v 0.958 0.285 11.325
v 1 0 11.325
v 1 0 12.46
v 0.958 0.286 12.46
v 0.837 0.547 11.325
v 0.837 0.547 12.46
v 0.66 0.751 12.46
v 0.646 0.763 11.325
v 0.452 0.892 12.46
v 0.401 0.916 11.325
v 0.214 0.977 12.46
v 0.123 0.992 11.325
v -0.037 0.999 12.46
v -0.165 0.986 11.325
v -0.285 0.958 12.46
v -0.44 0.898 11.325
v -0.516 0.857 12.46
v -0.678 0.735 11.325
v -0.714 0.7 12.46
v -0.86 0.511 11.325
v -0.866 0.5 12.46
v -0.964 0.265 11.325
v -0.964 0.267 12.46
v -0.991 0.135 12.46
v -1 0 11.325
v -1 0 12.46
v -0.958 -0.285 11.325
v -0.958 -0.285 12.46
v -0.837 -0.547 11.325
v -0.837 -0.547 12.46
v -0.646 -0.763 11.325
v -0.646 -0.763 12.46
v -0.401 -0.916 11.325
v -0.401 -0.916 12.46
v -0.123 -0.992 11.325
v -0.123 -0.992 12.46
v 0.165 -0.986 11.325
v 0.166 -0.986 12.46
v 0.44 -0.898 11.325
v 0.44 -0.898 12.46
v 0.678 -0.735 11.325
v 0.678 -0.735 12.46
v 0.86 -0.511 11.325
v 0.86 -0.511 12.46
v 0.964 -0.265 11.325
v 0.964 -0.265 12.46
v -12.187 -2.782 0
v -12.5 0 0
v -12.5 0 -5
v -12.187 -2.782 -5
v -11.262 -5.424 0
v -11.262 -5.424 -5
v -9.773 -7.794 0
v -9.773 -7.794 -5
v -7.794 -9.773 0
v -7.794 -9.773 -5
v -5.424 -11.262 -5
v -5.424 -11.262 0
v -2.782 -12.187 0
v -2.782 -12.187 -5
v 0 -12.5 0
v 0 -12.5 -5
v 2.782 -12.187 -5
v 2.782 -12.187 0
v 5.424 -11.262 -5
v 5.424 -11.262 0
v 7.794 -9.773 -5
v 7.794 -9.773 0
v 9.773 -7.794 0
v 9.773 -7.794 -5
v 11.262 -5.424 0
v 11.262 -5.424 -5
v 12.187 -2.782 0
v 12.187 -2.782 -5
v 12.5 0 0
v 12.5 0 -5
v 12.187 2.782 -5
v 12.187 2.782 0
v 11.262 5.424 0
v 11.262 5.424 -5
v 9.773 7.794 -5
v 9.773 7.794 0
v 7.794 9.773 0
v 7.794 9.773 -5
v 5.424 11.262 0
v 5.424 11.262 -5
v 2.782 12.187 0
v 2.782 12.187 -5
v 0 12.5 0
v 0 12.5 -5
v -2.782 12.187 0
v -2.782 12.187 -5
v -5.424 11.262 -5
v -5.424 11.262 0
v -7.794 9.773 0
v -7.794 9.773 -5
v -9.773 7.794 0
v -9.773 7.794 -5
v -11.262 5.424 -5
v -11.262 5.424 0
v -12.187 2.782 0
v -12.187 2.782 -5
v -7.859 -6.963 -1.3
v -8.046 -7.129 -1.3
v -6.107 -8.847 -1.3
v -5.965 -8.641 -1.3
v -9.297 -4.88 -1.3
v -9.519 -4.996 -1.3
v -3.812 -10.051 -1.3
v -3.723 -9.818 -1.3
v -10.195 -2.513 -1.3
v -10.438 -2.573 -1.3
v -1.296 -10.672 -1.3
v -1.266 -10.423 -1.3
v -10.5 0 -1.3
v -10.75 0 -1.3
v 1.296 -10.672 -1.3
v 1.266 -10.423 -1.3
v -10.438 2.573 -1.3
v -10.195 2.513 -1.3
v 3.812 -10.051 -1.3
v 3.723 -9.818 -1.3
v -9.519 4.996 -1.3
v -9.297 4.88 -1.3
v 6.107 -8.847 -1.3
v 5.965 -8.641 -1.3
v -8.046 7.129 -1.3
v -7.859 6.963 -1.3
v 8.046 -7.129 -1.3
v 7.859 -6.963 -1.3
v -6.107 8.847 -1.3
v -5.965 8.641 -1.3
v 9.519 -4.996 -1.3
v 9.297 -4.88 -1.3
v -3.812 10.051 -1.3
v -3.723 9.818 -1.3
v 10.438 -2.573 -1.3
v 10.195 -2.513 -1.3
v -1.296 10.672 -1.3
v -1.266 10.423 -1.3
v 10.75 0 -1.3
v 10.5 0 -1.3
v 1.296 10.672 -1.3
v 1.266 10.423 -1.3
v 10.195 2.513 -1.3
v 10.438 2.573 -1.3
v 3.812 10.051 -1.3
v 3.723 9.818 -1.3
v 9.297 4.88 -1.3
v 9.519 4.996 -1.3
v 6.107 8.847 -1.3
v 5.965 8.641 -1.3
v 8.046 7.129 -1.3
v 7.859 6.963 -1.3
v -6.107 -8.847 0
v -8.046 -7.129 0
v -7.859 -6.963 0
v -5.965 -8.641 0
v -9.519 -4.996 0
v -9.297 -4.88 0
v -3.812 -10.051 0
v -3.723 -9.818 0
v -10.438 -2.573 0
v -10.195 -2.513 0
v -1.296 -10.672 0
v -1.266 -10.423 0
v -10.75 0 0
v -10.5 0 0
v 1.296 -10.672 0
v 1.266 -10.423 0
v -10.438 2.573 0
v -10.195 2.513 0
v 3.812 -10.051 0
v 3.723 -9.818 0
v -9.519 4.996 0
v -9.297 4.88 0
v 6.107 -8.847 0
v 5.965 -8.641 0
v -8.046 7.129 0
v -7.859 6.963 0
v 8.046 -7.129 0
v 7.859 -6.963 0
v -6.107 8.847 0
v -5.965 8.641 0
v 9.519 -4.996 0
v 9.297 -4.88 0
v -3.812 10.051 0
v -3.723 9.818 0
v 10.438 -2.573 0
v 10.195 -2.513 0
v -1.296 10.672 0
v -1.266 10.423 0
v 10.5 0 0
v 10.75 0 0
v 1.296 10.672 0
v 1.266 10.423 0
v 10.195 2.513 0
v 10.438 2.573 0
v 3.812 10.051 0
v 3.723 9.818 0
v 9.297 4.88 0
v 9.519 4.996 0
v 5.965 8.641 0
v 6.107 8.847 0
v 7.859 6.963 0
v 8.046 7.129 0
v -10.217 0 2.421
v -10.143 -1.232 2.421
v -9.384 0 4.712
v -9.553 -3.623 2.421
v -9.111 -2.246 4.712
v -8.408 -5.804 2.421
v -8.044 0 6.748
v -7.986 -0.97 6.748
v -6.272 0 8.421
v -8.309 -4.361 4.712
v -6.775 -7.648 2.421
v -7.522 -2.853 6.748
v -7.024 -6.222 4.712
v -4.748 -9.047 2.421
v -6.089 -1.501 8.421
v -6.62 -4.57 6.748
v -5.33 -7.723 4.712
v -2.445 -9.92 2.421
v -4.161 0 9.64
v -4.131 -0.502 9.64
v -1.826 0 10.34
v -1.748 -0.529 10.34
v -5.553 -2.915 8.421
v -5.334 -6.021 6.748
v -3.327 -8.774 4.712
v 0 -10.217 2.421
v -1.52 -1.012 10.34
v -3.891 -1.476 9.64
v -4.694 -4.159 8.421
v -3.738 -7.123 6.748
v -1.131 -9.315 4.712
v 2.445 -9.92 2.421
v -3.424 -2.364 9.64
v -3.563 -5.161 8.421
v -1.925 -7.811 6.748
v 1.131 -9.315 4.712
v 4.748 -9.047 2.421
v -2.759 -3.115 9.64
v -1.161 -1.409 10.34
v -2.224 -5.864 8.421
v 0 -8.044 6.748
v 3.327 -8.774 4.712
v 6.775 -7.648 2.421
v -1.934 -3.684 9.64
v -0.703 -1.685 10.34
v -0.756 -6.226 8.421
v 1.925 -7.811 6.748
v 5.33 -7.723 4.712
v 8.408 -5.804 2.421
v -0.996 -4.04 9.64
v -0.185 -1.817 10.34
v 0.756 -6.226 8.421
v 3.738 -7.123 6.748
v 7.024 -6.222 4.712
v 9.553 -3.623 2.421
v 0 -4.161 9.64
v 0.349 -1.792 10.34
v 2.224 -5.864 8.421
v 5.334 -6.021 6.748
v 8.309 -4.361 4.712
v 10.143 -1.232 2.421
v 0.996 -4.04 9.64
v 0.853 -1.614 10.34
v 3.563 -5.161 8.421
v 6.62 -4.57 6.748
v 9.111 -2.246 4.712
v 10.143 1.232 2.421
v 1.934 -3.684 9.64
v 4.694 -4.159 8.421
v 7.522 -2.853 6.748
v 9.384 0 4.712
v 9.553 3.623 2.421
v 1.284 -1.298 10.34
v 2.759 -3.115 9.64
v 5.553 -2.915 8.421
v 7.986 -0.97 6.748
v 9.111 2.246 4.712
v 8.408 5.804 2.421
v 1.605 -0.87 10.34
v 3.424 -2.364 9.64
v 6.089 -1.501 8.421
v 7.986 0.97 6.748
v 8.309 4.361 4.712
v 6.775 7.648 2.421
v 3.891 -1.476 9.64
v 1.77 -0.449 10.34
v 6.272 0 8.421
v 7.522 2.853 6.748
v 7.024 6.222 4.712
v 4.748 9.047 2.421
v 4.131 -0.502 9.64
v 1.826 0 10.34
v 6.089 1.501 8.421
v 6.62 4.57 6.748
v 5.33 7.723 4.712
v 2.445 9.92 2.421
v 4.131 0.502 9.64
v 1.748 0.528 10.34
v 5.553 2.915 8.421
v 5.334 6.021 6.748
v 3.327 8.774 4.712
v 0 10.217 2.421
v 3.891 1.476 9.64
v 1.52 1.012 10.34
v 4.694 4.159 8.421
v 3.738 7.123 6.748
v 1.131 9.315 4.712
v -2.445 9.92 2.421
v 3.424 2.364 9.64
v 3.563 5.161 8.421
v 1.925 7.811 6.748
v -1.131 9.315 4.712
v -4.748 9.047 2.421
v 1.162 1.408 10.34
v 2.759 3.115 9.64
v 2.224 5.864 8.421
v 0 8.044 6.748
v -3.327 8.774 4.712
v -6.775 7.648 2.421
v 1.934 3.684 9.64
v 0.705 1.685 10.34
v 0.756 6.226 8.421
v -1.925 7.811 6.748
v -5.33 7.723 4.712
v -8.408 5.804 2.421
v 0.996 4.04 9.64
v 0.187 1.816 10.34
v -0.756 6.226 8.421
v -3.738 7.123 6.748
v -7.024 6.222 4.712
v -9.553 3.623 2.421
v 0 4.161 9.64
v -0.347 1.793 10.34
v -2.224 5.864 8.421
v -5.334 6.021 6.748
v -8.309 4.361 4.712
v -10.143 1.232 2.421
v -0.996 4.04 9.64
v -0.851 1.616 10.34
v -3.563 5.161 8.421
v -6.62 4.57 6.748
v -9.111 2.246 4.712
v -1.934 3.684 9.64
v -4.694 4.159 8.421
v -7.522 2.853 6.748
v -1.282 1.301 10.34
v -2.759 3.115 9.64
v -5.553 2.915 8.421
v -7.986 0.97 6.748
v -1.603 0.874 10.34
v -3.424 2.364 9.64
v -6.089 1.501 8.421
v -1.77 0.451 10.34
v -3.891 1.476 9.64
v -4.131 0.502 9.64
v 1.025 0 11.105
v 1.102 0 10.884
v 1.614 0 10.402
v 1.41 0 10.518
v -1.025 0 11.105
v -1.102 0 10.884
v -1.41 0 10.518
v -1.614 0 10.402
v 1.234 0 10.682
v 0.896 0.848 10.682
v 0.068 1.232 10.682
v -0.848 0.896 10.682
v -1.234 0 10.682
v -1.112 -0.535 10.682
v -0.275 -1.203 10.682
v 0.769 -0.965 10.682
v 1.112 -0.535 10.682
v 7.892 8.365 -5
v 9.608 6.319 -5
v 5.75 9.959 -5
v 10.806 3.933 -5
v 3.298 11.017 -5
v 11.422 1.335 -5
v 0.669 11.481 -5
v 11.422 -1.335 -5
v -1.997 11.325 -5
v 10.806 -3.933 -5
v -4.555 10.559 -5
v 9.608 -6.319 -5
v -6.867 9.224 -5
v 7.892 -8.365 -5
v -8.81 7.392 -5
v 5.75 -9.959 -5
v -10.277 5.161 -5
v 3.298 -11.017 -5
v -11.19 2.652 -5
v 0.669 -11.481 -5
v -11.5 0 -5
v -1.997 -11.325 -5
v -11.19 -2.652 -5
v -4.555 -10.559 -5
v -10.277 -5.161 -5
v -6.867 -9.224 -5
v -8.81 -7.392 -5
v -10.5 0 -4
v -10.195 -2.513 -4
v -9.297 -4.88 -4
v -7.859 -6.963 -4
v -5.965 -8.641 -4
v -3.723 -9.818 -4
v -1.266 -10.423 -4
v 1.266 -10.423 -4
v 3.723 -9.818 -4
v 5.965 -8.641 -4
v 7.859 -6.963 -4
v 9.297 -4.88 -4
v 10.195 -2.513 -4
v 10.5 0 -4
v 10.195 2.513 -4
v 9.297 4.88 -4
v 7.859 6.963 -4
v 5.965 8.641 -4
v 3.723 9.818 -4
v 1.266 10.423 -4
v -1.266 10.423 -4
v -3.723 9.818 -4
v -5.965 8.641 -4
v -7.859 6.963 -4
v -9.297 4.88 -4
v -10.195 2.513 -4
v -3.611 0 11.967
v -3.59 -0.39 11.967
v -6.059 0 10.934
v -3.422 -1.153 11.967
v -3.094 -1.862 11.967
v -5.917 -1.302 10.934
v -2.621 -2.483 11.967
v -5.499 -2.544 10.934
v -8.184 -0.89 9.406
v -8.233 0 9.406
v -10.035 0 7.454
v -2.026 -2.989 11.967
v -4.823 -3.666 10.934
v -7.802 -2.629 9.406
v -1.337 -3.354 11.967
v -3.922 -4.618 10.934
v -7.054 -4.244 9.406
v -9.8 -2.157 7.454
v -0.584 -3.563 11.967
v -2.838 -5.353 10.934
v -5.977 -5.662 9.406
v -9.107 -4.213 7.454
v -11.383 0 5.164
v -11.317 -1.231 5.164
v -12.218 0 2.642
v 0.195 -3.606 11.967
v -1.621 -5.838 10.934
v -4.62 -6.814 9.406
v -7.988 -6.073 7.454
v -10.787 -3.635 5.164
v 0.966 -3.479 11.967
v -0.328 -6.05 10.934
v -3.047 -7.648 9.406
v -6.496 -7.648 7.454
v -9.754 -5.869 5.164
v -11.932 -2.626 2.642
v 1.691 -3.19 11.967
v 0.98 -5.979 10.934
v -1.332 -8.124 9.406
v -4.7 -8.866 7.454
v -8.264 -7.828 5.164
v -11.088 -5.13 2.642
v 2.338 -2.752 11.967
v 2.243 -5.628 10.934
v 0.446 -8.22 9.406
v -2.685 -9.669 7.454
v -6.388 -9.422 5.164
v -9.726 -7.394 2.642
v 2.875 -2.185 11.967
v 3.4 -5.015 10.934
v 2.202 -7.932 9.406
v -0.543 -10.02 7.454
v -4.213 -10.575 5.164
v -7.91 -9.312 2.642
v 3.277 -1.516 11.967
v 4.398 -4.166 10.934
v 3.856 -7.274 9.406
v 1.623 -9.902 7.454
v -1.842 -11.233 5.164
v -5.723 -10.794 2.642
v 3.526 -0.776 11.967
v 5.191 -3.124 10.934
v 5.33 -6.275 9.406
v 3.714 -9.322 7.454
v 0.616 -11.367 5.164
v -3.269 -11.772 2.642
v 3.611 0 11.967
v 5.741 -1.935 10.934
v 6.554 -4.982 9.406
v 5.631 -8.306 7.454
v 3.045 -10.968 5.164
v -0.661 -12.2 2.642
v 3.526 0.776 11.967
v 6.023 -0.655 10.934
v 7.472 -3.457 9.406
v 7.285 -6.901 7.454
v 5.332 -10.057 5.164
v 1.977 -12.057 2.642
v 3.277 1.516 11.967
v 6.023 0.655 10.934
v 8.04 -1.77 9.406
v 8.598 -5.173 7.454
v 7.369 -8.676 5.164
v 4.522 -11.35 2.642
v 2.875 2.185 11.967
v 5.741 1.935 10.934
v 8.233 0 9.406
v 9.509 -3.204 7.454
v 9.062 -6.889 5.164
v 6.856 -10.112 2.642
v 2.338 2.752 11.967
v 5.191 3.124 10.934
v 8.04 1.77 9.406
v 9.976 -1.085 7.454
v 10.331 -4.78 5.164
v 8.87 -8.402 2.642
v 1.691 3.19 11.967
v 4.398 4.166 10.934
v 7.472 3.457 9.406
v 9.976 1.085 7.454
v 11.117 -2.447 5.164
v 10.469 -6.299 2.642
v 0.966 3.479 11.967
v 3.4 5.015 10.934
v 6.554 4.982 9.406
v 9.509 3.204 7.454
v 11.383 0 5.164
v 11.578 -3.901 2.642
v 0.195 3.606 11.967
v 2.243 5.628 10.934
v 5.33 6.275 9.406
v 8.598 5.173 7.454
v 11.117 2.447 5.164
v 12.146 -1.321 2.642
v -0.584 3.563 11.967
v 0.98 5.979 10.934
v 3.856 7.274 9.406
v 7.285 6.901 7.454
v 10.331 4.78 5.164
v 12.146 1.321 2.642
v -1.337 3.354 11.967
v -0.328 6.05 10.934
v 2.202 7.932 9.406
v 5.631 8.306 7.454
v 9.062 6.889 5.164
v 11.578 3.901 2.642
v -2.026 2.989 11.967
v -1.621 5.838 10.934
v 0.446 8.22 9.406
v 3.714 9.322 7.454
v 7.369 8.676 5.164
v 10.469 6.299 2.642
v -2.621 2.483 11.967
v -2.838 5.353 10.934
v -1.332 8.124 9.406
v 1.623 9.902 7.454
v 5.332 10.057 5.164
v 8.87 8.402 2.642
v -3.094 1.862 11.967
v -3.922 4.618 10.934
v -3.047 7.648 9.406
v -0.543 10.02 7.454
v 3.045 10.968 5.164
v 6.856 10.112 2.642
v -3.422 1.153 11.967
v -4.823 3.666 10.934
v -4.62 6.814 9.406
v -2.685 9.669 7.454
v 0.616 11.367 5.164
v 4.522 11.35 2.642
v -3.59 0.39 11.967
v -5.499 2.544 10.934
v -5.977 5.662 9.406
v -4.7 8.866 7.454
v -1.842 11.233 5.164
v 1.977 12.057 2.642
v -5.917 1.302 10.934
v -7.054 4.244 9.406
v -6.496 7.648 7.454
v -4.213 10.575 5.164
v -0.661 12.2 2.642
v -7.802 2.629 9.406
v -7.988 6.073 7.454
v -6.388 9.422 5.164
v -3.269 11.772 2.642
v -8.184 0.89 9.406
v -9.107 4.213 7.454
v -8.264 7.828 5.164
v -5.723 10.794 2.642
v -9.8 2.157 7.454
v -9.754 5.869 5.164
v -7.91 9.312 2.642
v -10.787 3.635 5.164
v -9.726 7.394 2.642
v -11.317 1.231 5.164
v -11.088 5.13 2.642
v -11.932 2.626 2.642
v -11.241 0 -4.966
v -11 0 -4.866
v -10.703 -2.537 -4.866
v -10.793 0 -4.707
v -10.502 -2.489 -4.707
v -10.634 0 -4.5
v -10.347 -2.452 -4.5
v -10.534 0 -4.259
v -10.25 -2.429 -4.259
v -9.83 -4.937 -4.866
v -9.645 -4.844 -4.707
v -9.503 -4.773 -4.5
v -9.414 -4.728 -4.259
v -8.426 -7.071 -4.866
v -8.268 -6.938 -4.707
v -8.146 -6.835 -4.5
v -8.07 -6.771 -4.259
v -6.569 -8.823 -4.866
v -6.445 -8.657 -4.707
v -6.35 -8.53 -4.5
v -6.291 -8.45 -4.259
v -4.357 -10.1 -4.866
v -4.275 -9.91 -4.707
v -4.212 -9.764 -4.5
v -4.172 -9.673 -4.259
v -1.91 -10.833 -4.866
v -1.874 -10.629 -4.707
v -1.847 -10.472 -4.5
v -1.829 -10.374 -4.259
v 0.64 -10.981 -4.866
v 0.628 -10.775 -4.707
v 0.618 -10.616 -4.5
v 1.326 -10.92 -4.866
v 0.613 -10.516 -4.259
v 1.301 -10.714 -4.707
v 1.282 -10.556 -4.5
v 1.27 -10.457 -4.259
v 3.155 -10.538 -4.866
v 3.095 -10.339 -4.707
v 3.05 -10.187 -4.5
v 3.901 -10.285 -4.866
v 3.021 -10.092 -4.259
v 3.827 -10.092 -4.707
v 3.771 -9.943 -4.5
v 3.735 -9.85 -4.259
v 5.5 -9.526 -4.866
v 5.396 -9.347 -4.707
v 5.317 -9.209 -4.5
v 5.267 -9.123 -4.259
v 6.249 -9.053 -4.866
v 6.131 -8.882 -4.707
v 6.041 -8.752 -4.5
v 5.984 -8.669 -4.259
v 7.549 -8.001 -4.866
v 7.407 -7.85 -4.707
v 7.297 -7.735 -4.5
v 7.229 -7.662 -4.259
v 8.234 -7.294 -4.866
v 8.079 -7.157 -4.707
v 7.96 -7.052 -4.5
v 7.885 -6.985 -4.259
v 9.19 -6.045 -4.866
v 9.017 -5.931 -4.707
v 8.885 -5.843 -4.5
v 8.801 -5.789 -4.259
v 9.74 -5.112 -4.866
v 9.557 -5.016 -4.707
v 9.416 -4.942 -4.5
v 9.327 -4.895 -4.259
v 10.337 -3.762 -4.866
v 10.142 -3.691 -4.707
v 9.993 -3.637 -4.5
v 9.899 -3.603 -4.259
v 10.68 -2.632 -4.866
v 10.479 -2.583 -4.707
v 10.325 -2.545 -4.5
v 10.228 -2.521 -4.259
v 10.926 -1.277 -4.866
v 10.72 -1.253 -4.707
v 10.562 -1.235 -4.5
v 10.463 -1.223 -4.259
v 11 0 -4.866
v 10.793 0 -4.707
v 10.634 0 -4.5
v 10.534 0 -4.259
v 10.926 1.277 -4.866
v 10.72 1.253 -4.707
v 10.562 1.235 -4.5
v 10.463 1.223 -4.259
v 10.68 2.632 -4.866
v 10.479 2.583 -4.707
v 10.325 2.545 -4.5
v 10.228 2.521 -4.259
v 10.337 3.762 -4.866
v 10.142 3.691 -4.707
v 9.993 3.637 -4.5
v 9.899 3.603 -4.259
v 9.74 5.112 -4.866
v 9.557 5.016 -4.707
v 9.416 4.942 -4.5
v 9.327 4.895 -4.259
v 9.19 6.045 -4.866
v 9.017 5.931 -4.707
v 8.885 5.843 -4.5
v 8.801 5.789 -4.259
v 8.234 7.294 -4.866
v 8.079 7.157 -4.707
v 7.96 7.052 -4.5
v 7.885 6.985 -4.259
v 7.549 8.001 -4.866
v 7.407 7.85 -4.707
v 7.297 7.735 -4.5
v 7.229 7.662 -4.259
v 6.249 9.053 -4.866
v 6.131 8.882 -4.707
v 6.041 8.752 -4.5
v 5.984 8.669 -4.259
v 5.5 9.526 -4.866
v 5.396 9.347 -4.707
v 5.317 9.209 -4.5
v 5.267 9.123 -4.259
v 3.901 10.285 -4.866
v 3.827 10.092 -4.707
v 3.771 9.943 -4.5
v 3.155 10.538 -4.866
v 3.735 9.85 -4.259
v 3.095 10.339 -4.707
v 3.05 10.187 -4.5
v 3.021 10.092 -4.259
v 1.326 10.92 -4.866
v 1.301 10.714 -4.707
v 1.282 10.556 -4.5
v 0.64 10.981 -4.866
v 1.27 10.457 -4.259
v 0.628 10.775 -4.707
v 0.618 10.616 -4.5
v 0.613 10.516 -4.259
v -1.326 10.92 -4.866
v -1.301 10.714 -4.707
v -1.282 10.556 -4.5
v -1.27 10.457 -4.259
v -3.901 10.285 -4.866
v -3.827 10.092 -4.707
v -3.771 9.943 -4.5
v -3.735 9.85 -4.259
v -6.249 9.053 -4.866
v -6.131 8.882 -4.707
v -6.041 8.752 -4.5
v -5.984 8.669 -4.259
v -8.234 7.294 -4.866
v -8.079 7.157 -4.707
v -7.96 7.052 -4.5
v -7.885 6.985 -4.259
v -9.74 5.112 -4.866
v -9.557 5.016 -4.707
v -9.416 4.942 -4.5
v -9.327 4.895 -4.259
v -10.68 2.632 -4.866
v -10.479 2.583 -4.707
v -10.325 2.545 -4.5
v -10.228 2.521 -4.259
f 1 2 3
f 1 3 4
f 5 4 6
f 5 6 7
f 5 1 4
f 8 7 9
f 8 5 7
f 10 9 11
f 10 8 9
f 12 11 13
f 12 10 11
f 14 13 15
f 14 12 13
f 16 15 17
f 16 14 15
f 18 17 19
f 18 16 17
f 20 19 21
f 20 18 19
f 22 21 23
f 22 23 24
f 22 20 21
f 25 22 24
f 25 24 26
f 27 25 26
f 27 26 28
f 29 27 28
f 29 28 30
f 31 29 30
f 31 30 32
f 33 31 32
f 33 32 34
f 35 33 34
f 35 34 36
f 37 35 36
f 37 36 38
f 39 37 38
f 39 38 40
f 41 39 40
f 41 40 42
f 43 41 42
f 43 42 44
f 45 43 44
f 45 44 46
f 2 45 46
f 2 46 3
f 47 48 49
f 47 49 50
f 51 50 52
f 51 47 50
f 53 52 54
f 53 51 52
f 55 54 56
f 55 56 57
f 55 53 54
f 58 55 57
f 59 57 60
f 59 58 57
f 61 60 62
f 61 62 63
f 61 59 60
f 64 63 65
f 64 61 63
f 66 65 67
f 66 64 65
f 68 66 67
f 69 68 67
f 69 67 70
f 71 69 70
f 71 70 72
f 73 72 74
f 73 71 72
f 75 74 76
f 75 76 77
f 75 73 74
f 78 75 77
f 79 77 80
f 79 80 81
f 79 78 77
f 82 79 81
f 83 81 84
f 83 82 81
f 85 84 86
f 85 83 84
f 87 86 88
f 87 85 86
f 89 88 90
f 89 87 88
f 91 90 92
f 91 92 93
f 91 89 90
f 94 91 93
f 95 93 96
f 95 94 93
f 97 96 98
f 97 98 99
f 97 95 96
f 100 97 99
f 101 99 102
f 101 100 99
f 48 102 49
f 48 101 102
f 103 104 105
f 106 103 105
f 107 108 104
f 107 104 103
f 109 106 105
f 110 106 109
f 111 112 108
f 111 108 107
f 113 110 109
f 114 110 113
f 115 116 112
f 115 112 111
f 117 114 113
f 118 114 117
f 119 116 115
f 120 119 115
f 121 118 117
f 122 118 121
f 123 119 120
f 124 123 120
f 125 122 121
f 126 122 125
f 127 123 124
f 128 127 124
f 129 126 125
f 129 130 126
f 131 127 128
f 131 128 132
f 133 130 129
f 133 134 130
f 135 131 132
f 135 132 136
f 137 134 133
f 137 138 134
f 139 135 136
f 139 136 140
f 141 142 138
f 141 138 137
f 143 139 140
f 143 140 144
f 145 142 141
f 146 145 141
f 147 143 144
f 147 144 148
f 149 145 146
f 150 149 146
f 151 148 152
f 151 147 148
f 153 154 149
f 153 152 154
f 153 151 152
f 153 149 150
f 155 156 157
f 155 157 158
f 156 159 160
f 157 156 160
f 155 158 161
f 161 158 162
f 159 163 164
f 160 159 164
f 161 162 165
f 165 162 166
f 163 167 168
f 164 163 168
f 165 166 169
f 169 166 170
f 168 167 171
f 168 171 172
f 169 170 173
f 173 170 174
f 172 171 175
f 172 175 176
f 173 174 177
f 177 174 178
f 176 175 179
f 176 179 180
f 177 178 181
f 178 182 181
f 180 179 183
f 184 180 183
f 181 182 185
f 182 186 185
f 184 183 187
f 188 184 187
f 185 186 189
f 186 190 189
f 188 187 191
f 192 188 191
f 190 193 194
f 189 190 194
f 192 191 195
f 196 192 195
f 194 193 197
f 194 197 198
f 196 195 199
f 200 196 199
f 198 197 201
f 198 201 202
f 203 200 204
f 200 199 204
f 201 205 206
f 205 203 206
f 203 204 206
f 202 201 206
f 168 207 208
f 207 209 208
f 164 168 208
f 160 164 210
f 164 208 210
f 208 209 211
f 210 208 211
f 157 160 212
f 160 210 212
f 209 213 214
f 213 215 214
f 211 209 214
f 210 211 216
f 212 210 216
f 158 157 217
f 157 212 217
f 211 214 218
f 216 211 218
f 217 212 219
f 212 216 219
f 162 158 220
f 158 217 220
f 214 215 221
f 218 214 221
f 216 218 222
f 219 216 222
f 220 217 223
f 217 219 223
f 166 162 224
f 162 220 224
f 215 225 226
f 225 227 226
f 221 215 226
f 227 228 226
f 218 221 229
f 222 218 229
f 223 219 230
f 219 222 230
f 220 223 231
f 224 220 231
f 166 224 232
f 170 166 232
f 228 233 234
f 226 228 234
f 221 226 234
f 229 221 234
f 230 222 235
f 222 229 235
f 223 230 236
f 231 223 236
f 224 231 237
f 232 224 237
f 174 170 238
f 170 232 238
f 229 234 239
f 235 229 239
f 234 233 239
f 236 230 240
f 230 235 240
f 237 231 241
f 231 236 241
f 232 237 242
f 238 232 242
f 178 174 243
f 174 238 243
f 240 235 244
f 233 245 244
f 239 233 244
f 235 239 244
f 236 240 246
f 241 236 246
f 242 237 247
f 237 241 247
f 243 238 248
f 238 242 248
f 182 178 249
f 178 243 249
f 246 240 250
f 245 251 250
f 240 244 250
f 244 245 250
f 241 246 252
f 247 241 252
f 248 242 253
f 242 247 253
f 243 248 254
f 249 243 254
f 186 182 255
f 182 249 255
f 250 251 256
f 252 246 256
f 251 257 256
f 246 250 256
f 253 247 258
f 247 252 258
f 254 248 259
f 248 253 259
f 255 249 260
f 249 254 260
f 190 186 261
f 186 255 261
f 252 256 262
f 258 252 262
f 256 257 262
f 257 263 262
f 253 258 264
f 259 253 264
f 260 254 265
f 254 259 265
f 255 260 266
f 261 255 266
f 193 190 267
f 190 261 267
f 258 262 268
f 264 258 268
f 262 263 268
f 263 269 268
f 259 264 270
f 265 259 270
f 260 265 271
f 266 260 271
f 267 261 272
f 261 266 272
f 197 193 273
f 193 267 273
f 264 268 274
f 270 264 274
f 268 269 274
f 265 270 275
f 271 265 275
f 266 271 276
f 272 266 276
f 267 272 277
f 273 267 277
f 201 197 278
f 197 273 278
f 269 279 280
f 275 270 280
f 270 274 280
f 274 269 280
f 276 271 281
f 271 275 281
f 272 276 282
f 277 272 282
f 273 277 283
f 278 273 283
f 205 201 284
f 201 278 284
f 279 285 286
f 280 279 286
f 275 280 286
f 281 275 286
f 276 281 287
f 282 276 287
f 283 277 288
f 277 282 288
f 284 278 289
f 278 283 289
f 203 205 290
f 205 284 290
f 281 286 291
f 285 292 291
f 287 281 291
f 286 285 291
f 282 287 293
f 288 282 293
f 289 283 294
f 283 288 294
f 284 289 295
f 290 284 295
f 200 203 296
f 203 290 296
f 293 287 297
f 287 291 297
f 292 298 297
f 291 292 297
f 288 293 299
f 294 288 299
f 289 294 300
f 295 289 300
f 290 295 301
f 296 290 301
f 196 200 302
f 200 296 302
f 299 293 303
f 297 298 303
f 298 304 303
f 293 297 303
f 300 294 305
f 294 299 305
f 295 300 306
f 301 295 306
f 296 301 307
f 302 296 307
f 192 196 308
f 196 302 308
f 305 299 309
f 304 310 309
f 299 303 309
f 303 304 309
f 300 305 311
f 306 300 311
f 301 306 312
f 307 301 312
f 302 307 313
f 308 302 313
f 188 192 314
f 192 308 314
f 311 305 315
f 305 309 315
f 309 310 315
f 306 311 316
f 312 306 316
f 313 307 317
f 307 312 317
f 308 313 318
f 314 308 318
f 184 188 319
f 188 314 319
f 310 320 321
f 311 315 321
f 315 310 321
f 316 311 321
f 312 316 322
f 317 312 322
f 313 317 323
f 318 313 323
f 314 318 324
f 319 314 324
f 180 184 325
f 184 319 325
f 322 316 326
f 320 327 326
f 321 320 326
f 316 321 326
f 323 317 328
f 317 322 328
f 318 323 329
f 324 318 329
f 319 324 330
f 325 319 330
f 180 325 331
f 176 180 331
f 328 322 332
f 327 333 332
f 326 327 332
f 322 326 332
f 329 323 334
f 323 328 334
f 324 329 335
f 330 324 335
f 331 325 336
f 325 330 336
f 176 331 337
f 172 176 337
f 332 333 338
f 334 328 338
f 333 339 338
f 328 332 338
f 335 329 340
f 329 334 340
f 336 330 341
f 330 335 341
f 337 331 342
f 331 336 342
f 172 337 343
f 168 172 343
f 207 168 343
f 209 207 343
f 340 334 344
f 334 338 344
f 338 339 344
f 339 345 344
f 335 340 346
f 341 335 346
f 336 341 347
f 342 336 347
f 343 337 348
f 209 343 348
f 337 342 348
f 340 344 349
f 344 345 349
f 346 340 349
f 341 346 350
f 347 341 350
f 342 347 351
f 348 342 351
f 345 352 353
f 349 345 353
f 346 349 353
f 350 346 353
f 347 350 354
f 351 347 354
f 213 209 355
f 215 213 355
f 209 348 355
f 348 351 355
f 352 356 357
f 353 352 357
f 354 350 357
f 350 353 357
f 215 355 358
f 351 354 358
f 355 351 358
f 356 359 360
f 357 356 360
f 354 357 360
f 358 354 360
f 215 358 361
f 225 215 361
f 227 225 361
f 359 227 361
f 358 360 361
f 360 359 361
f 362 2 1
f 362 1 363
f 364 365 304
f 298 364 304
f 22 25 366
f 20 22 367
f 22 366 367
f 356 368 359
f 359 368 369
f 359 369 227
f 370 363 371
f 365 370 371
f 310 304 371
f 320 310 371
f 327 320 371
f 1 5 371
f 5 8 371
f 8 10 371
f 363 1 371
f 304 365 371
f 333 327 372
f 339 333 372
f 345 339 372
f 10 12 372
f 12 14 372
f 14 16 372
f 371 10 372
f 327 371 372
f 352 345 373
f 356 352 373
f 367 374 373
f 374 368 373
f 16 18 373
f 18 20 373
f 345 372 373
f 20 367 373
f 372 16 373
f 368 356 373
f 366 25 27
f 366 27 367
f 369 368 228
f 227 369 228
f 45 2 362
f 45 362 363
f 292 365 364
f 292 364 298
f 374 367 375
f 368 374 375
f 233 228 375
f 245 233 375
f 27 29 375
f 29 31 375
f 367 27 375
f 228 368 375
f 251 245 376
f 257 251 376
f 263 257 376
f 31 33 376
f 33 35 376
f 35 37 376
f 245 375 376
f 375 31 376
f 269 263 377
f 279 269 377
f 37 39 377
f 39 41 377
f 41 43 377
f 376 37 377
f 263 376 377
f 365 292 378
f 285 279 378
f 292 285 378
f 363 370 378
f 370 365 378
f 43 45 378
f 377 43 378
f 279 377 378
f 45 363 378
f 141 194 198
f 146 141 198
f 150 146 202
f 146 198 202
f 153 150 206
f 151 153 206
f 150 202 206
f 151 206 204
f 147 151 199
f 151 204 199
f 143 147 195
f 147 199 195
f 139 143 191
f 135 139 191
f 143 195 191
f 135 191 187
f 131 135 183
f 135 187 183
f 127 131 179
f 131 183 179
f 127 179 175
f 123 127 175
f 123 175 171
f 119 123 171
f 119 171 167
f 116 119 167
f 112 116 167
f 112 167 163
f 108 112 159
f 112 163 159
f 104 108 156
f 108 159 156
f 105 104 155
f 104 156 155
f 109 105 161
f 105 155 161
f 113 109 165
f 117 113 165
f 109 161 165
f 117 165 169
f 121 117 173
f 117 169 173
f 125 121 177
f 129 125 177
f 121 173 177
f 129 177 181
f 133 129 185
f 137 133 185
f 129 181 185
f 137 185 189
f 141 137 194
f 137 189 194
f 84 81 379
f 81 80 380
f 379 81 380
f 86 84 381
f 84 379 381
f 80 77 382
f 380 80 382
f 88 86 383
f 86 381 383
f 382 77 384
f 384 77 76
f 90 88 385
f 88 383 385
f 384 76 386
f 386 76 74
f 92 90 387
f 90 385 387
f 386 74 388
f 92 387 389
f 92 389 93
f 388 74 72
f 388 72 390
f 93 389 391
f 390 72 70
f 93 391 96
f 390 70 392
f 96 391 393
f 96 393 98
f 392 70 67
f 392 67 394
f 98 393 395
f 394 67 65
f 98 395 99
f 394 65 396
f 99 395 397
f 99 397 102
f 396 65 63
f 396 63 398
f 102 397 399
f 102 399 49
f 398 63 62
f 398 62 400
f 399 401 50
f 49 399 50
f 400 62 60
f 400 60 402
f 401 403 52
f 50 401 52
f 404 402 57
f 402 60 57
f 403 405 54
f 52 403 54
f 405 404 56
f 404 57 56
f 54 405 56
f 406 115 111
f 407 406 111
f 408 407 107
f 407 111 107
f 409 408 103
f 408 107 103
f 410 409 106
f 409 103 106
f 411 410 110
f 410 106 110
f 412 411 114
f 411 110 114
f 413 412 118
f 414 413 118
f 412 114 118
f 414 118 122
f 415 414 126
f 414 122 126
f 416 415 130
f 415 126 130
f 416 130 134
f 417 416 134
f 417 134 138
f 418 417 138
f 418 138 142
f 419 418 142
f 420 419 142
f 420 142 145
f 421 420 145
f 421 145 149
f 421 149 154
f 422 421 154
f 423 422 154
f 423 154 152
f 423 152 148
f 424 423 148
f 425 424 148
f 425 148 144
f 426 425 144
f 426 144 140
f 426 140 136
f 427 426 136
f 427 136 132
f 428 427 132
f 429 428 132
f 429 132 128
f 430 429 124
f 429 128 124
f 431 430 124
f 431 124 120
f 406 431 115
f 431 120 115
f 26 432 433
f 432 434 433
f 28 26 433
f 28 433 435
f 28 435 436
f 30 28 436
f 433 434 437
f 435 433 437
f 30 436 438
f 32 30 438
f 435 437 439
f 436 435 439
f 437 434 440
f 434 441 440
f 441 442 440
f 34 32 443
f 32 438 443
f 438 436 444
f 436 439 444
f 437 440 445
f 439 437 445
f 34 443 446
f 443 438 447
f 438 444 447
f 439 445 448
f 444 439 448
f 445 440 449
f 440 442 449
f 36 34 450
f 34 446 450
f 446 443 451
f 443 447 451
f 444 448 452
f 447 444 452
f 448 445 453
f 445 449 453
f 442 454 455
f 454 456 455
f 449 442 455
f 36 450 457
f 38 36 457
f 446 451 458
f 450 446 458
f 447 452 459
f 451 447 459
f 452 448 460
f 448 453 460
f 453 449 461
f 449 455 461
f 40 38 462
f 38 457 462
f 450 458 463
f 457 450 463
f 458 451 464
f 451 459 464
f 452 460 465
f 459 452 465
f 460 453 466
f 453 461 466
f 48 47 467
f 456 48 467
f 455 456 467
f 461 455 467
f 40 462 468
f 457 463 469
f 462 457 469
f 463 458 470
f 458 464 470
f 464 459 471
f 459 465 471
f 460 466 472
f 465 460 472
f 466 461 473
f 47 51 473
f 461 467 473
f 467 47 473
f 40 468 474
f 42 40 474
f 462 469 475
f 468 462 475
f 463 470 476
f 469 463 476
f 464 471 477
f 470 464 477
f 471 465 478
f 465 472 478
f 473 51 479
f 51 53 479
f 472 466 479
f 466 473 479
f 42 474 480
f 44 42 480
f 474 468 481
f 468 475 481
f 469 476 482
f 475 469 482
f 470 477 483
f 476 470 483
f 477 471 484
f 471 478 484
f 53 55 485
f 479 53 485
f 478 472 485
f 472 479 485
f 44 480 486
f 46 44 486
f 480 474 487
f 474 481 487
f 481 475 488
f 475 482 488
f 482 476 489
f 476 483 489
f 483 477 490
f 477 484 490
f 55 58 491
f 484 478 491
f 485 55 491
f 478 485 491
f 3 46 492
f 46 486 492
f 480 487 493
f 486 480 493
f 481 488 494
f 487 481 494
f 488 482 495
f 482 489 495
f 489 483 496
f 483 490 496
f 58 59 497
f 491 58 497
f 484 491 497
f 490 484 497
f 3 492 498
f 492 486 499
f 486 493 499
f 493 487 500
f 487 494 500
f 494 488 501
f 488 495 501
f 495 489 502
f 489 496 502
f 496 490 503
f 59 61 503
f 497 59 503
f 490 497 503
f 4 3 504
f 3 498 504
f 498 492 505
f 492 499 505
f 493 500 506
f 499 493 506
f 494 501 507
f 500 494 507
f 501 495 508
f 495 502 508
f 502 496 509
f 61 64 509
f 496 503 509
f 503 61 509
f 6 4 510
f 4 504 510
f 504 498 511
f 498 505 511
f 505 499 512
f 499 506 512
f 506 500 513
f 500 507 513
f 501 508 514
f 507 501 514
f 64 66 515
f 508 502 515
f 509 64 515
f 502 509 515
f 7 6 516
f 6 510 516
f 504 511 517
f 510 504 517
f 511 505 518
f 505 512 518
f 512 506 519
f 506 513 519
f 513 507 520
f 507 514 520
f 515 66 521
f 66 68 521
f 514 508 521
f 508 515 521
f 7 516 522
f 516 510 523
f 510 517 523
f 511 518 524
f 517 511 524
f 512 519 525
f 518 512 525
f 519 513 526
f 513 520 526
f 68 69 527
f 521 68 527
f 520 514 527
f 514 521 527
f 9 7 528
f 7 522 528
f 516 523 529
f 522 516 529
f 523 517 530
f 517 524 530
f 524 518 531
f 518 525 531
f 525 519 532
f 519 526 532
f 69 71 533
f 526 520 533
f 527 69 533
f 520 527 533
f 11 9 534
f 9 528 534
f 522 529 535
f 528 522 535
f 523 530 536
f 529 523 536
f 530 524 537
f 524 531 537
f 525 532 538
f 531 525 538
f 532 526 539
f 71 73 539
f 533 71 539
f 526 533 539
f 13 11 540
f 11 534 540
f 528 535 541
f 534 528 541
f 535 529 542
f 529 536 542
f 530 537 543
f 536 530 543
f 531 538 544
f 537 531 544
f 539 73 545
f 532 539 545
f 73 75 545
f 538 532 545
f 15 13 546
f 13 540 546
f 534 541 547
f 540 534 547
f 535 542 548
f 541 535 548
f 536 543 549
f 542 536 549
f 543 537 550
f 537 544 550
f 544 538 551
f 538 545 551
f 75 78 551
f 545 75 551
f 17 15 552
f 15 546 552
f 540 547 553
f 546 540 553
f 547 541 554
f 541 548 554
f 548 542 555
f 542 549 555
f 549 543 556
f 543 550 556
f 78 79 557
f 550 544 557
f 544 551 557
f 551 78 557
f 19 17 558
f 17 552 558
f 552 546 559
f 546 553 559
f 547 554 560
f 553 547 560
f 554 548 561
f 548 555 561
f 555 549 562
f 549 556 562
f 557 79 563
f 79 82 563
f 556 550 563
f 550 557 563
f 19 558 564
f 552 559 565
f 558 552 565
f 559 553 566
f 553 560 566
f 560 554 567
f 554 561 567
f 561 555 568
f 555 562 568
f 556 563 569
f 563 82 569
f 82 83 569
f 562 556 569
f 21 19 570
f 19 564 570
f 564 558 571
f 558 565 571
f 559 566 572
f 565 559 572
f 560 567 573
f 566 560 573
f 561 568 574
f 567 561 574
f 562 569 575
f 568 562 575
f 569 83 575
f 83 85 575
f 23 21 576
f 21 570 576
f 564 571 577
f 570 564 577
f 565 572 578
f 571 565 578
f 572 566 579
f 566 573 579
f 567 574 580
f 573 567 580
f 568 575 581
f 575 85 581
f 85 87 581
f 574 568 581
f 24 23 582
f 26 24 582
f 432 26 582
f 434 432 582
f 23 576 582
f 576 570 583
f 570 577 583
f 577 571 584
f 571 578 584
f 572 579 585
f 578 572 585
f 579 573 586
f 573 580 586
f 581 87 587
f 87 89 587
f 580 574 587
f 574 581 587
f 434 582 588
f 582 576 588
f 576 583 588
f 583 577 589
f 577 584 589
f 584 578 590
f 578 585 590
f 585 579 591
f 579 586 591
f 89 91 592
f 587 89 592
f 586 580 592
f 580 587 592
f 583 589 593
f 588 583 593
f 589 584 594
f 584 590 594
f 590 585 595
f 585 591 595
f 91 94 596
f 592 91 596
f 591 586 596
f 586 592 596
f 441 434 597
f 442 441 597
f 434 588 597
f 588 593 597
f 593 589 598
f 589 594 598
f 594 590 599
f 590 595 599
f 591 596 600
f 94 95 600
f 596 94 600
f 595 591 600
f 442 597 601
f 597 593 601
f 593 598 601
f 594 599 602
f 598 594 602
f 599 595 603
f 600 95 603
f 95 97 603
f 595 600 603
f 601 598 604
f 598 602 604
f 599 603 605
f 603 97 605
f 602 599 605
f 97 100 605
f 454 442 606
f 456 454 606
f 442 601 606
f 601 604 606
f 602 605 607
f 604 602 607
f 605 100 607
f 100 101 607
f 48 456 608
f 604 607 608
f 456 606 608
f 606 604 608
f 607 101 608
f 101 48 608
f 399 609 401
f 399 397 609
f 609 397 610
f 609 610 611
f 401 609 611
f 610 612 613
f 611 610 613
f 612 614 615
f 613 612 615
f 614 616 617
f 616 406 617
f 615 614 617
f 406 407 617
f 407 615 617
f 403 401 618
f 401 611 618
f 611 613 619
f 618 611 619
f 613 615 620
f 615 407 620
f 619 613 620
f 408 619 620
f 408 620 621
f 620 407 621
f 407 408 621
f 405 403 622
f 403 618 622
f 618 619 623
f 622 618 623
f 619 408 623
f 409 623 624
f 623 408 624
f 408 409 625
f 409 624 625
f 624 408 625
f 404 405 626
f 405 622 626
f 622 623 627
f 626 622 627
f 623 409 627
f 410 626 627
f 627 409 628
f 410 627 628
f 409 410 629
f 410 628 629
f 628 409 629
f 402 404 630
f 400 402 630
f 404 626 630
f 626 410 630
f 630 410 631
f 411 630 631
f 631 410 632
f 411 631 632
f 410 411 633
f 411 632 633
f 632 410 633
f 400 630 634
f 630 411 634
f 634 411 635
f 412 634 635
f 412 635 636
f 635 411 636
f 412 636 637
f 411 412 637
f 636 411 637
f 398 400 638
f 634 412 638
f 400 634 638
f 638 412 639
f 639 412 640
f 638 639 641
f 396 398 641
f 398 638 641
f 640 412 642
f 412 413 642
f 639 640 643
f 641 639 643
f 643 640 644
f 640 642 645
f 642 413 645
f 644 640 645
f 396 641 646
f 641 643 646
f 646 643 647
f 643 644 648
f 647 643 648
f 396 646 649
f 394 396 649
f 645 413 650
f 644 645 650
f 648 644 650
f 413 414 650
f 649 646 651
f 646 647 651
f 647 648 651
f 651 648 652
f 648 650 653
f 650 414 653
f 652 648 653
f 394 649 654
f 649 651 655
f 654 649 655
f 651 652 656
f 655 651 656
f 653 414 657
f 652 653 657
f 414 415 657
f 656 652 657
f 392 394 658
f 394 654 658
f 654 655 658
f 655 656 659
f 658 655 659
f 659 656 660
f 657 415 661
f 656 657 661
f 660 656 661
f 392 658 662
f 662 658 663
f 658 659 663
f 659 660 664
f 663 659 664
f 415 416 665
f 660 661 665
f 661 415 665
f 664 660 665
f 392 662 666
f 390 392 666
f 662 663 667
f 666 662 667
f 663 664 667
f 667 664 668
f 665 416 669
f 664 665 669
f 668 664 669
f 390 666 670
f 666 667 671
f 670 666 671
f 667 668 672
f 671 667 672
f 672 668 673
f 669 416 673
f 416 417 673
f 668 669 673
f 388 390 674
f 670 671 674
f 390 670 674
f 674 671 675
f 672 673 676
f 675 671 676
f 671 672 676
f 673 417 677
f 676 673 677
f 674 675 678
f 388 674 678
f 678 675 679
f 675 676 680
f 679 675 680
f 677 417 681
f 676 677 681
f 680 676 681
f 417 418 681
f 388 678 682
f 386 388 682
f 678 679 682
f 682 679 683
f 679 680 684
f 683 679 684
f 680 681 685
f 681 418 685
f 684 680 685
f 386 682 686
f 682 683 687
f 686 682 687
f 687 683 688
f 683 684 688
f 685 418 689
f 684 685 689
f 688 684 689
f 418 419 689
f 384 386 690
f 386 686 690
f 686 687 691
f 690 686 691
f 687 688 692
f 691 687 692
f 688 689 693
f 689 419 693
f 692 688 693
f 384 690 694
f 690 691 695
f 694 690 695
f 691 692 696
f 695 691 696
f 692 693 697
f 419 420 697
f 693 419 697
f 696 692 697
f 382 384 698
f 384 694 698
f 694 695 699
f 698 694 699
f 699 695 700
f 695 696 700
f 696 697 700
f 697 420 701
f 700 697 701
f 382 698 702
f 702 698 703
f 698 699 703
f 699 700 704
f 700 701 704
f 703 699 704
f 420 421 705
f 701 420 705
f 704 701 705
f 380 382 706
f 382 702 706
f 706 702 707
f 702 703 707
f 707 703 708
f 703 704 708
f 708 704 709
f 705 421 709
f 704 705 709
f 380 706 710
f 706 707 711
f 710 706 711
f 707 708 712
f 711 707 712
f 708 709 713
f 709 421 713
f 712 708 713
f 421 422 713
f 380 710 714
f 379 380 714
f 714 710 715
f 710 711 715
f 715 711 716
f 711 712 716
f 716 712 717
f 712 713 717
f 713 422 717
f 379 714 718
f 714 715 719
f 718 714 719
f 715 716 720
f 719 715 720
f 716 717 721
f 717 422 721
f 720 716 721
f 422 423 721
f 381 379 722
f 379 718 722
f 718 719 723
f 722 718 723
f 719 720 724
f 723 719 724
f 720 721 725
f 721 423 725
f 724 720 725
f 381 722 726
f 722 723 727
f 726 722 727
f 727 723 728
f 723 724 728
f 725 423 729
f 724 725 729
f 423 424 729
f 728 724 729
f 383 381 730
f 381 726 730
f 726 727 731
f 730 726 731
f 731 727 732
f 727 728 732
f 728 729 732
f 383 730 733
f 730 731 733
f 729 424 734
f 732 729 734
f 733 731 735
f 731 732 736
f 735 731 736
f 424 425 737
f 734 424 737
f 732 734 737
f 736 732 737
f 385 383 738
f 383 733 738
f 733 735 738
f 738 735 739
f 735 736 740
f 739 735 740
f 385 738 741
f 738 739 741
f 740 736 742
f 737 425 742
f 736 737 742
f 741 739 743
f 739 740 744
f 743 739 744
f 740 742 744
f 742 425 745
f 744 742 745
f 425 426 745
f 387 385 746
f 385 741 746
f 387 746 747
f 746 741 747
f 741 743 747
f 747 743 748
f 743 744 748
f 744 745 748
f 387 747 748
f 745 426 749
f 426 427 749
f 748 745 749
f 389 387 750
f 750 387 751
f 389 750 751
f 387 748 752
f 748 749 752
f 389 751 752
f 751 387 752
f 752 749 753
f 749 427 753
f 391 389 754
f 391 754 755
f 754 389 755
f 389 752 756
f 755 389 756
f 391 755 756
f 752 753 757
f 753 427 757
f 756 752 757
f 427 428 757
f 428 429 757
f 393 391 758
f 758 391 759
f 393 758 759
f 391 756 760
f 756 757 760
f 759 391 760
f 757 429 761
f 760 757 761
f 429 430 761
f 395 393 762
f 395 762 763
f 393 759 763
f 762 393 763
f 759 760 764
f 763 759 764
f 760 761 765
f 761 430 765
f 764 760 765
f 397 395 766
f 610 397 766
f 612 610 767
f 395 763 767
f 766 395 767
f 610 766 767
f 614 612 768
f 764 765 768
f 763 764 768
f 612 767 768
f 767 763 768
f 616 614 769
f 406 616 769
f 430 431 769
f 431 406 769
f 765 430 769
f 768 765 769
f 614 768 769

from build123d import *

# Parameters (mm, degrees)
F4_DEPTH = 5
F3_R     = 10.75
F5_DEPTH = 1.3
F6_R     = 1
F7_DEPTH = 22.1
F8_R     = 1


with BuildPart() as f2:
    # F0 (on Front) → F2 (revolve)
    with BuildSketch(Plane.XZ):
        with BuildLine():
            ThreePointArc((-10.5, 0), (-7.4246212025, 7.4246212025), (0, 10.5))
            Line((0, 10.5), (0, 12.5))
            ThreePointArc((0, 12.5), (-8.8388347648, 8.8388347648), (-12.5, 0))
            Line((-12.5, 0), (-10.5, 0))
        make_face()
    revolve(axis=Axis((0, 0, 21.9115), (0, 0, 1)))

    # F4 (add): a face of the model
    f4_faces = [f2.faces().sort_by_distance(p)[0] for p in [
        (12.1464466094, 0, 0),
    ]]
    extrude(f4_faces, amount=F4_DEPTH)

    # F3 (on Top) → F5 (cut)
    with BuildSketch(Plane.XY):
        Circle(F3_R)
    extrude(amount=-F5_DEPTH, mode=Mode.SUBTRACT)

    # F6 (on Top) → F7 (cut)
    with BuildSketch(Plane.XY):
        Circle(F6_R)
    extrude(amount=F7_DEPTH, mode=Mode.SUBTRACT)

    # F8
    f8_edges = [f2.edges().sort_by_distance(p)[0] for p in [
        (10.5, 0, -5),
        (0, -1, 10.452272),
        (0, 1, 10.452272),
    ]]
    fillet(f8_edges, radius=F8_R)


solid = f2.part
